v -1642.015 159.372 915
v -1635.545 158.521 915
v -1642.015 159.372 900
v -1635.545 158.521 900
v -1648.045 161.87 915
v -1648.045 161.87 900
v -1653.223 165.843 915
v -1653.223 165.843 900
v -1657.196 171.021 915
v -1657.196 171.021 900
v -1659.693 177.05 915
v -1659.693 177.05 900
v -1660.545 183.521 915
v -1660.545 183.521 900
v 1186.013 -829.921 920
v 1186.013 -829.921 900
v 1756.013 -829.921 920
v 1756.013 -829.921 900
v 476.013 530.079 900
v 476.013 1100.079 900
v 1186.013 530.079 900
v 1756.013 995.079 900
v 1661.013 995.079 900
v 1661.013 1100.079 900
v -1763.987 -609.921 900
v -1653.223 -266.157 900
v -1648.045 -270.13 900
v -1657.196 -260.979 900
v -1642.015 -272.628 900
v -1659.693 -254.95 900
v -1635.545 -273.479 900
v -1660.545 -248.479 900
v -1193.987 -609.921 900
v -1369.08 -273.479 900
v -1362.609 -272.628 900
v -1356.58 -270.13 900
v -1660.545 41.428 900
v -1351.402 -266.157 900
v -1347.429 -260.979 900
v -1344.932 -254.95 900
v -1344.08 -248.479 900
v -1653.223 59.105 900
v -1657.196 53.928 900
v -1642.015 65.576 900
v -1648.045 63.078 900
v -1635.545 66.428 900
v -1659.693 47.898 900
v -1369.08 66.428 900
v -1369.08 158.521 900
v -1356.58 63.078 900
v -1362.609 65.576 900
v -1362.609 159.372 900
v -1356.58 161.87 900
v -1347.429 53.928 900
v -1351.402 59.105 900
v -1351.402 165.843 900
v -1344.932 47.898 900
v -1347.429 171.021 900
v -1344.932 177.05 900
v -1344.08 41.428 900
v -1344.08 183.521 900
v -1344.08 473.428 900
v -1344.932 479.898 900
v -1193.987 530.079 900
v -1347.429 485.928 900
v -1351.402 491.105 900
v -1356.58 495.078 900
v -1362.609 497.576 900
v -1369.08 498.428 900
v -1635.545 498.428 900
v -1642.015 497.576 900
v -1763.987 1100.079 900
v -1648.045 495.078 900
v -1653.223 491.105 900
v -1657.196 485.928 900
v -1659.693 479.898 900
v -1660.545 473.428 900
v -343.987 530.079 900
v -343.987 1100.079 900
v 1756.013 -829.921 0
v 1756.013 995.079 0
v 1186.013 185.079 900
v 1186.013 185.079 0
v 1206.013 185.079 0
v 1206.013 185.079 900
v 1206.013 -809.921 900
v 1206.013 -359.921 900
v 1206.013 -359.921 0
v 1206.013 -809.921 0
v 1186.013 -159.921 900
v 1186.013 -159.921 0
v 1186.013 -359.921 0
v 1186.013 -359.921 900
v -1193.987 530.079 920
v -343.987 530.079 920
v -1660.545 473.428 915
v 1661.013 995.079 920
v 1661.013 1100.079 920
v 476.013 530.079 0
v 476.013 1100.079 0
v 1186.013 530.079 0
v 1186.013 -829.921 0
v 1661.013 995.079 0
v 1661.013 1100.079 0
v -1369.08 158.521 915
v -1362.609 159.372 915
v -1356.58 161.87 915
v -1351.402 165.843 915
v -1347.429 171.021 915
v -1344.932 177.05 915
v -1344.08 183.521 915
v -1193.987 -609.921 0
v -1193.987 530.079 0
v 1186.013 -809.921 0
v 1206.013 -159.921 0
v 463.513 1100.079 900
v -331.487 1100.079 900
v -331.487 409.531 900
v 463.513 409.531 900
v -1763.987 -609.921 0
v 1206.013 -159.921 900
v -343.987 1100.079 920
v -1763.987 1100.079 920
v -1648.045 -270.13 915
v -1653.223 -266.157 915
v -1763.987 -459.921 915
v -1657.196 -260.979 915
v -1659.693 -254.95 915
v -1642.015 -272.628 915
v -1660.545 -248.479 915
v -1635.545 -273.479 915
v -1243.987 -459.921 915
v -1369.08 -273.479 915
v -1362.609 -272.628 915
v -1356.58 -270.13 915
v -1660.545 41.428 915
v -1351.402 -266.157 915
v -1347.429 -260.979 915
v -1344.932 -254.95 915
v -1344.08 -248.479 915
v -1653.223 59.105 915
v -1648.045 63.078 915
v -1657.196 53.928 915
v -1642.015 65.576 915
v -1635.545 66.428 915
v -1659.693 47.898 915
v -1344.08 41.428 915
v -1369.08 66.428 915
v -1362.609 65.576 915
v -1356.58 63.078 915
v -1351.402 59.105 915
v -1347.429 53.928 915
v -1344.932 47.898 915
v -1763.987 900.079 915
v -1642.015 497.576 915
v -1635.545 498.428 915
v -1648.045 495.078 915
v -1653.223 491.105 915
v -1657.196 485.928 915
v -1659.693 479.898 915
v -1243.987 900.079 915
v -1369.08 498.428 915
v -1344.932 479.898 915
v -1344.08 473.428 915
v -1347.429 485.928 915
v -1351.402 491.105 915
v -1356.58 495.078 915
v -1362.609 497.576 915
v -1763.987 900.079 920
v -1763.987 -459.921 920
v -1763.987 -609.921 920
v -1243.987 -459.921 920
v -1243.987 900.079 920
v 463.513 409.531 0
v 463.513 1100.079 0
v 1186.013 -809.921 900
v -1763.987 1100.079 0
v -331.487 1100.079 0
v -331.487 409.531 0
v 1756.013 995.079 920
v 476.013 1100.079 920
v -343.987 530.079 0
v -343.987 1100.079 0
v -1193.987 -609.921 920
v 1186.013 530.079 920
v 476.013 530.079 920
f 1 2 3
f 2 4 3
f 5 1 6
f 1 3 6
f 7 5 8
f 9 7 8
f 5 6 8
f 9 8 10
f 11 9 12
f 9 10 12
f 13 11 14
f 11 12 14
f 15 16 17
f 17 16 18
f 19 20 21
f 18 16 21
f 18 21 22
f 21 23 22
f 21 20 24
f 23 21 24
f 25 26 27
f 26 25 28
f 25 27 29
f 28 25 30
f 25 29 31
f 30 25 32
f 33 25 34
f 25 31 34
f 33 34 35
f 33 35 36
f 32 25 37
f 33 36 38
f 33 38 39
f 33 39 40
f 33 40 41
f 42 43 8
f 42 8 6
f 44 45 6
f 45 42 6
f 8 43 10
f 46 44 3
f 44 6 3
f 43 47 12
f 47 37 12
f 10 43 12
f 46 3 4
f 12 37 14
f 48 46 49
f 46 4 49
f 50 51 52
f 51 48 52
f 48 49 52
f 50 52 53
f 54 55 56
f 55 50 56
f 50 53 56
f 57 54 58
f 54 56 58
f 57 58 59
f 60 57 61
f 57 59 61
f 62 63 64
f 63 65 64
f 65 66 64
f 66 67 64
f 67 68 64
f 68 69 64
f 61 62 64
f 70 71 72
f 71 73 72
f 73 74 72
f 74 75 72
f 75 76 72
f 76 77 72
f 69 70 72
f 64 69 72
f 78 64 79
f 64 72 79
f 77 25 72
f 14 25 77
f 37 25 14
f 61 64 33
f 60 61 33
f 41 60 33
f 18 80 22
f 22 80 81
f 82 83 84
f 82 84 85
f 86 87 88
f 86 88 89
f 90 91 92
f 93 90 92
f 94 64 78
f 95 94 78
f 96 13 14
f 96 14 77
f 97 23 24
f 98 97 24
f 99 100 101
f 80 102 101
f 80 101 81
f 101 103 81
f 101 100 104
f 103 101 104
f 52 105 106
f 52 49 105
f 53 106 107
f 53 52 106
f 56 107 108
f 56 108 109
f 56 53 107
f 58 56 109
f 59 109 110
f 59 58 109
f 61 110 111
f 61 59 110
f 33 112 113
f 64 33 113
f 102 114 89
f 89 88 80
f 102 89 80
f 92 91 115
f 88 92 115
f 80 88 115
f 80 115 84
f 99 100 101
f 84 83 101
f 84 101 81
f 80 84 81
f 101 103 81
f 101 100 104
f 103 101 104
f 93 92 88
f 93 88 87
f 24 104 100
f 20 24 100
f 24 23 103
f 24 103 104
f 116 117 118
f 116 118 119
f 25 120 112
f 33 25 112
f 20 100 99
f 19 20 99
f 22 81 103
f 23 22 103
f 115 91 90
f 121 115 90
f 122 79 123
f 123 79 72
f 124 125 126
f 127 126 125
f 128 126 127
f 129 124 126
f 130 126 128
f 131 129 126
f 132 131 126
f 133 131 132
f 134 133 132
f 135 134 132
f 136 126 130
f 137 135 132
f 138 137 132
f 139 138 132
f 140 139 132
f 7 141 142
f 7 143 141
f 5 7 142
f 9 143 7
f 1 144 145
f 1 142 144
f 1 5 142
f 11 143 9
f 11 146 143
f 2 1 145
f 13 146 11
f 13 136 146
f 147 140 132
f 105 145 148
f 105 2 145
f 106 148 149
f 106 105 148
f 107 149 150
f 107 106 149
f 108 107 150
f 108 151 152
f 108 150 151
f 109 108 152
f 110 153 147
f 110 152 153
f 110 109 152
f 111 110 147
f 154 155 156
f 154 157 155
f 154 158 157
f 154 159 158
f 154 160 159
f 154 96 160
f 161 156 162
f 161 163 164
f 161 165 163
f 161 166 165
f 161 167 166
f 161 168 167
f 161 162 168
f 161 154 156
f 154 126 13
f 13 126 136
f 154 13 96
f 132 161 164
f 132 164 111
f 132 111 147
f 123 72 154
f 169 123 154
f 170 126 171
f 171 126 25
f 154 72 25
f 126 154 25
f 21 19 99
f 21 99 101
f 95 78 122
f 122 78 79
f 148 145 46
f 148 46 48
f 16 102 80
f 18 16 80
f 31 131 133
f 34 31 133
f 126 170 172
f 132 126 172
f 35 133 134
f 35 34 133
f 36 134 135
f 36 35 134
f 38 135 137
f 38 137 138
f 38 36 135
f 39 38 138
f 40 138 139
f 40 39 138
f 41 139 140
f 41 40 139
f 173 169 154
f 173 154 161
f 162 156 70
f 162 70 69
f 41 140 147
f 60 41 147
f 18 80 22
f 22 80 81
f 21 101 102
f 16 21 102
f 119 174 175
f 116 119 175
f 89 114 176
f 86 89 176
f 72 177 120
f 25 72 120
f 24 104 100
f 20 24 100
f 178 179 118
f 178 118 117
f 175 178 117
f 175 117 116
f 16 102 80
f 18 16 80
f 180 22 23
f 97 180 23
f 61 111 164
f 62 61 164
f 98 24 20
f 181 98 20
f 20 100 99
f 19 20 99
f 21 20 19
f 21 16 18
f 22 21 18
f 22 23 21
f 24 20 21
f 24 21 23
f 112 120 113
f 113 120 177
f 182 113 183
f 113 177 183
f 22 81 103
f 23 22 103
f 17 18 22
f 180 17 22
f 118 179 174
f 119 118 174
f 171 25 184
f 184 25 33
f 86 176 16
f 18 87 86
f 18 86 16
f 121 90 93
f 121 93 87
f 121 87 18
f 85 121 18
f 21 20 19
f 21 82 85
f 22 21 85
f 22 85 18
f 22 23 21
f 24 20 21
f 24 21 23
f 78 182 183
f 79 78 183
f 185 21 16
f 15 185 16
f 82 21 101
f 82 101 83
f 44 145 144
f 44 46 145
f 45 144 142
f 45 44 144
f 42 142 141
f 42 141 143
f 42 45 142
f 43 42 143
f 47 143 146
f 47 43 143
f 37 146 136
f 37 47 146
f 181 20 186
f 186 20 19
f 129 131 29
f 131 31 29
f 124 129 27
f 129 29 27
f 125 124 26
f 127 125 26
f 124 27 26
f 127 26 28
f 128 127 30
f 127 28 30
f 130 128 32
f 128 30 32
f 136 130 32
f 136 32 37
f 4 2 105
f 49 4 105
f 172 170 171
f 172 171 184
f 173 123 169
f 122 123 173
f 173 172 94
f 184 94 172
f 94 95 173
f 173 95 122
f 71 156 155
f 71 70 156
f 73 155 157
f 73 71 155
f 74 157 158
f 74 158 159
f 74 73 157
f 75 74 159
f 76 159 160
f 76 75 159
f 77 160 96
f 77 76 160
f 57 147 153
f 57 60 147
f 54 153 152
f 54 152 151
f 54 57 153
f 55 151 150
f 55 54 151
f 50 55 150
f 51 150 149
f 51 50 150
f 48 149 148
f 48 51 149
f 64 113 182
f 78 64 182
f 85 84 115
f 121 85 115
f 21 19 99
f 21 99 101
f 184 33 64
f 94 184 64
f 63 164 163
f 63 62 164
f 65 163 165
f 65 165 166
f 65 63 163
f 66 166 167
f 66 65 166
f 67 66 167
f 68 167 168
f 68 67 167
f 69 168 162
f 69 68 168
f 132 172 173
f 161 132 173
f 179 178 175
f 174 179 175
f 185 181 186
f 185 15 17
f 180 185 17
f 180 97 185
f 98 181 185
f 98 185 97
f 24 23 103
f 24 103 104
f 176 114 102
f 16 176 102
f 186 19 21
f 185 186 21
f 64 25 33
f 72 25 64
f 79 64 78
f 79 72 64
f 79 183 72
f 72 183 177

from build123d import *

# Parameters (mm, degrees)
F1_DEPTH  = 900
F2_DEPTH  = 900
F0_W      = 795
F0_H      = 690.5479426876
F3_DEPTH  = 20
F4_W      = 316.465139389
F4_H      = 339.9070054293
F5_DEPTH  = 20
F4_W_2    = 520
F4_H_2    = 1360
F6_DEPTH  = 5
F7_R      = 25
F8_DEPTH  = 900.001
F9_W      = 450
F9_H      = 900
F9_W_2    = 345
F10_DEPTH = 20


with BuildPart() as f1:
    # F0 (on Top) → F1 (new body)
    with BuildSketch(Plane.XY):
        Polygon((-1763.9867460728, 1100.0786612551), (-1763.9867460728, -609.9213387449), (-1193.9867460728, -609.9213387449), (-1193.9867460728, 530.0786612551), (-343.9867460728, 530.0786612551), (-343.9867460728, 1100.0786612551), align=None)
    extrude(amount=F1_DEPTH)


with BuildPart() as f1b:
    # F0 (on Top) → F1, piece 2 (new body)
    with BuildSketch(Plane.XY):
        Polygon((1661.0132539272, 1100.0786612551), (476.0132539272, 1100.0786612551), (476.0132539272, 530.0786612551), (1186.0132539272, 530.0786612551), (1186.0132539272, -829.9213387449), (1756.0132539272, -829.9213387449), (1756.0132539272, 995.0786612551), (1661.0132539272, 995.0786612551), align=None)
    extrude(amount=F1_DEPTH)


with BuildPart() as f2:
    # F0 (on Top) → F2 (new body)
    with BuildSketch(Plane.XY):
        Polygon((-1763.9867460728, 1100.0786612551), (-1763.9867460728, -609.9213387449), (-1193.9867460728, -609.9213387449), (-1193.9867460728, 530.0786612551), (-343.9867460728, 530.0786612551), (-343.9867460728, 1100.0786612551), align=None)
    extrude(amount=F2_DEPTH)

    # F8 (cut, through all): a face of the model
    f8_faces = [f2.faces().sort_by_distance(p)[0] for p in [
        (-1243.2445585728, 434.3364737551, 900),
    ]]
    extrude(f8_faces, amount=-F8_DEPTH, mode=Mode.SUBTRACT)


with BuildPart() as f2b:
    # F0 (on Top) → F2, piece 2 (new body)
    with BuildSketch(Plane.XY):
        Polygon((1661.0132539272, 1100.0786612551), (476.0132539272, 1100.0786612551), (476.0132539272, 530.0786612551), (1186.0132539272, 530.0786612551), (1186.0132539272, -829.9213387449), (1756.0132539272, -829.9213387449), (1756.0132539272, 995.0786612551), (1661.0132539272, 995.0786612551), align=None)
    extrude(amount=F2_DEPTH)

    # F9 (on face) → F10 (cut)
    with BuildSketch(Plane(origin=(1186.0132539272, 0, 0), x_dir=(0, -1, 0), z_dir=(-1, 0, 0))):
        with Locations((584.9213387449, 450)):
            Rectangle(F9_W, F9_H)
        with Locations((-12.5786612551, 450)):
            Rectangle(F9_W_2, F9_H)
    extrude(amount=-F10_DEPTH, mode=Mode.SUBTRACT)


with BuildPart() as f2c:
    # F0 (on Top) → F2, piece 3 (new body)
    with BuildSketch(Plane.XY):
        with Locations((66.0132539272, 754.8046899113)):
            Rectangle(F0_W, F0_H)
    extrude(amount=F2_DEPTH)


with BuildPart() as f3:
    # F3 (new): a face of the model
    f3_faces = [f1.part.faces().sort_by_distance(p)[0] for p in [
        (-1243.2445585728, 434.3364737551, 900),
    ]]
    extrude(f3_faces, amount=F3_DEPTH)

    # F4 (on face) → F5 (cut, through all)
    with BuildSketch(Plane.XY.offset(920)):
        with Locations((-1502.3123025894, -103.5259887576)):
            Rectangle(F4_W, F4_H)
        with Locations((-1502.3123025894, 328.4740373492)):
            Rectangle(F4_W, F4_H)
    extrude(amount=-F5_DEPTH, mode=Mode.SUBTRACT)

    # F4 (on face) → F6 (cut)
    with BuildSketch(Plane.XY.offset(920)):
        with Locations((-1503.9867460728, 220.0786612551)):
            Rectangle(F4_W_2, F4_H_2)
        with Locations((-1502.3123025894, -103.5259887576)):
            Rectangle(F4_W, F4_H, mode=Mode.SUBTRACT)
        with Locations((-1502.3123025894, 328.4740373492)):
            Rectangle(F4_W, F4_H, mode=Mode.SUBTRACT)
    extrude(amount=-F6_DEPTH, mode=Mode.SUBTRACT)

    # F7
    f7_edges = [f3.edges().sort_by_distance(p)[0] for p in [
        (-1344.079733, 158.520535, 907.5),
        (-1344.079733, -273.479491, 907.5),
        (-1660.544872, -273.479491, 907.5),
        (-1660.544872, 158.520535, 907.5),
        (-1660.544872, 66.427514, 907.5),
        (-1660.544872, 498.42754, 907.5),
        (-1344.079733, 498.42754, 907.5),
        (-1344.079733, 66.427514, 907.5),
    ]]
    fillet(f7_edges, radius=F7_R)


with BuildPart() as f3b:
    # F3#2 (new): a face of the model
    f3_2_faces = [f1b.part.faces().sort_by_distance(p)[0] for p in [
        (1296.1586304763, 313.088670788, 900),
    ]]
    extrude(f3_2_faces, amount=F3_DEPTH)


solid = Compound([f1.part, f1b.part, f2b.part, f2c.part, f3.part, f3b.part])
